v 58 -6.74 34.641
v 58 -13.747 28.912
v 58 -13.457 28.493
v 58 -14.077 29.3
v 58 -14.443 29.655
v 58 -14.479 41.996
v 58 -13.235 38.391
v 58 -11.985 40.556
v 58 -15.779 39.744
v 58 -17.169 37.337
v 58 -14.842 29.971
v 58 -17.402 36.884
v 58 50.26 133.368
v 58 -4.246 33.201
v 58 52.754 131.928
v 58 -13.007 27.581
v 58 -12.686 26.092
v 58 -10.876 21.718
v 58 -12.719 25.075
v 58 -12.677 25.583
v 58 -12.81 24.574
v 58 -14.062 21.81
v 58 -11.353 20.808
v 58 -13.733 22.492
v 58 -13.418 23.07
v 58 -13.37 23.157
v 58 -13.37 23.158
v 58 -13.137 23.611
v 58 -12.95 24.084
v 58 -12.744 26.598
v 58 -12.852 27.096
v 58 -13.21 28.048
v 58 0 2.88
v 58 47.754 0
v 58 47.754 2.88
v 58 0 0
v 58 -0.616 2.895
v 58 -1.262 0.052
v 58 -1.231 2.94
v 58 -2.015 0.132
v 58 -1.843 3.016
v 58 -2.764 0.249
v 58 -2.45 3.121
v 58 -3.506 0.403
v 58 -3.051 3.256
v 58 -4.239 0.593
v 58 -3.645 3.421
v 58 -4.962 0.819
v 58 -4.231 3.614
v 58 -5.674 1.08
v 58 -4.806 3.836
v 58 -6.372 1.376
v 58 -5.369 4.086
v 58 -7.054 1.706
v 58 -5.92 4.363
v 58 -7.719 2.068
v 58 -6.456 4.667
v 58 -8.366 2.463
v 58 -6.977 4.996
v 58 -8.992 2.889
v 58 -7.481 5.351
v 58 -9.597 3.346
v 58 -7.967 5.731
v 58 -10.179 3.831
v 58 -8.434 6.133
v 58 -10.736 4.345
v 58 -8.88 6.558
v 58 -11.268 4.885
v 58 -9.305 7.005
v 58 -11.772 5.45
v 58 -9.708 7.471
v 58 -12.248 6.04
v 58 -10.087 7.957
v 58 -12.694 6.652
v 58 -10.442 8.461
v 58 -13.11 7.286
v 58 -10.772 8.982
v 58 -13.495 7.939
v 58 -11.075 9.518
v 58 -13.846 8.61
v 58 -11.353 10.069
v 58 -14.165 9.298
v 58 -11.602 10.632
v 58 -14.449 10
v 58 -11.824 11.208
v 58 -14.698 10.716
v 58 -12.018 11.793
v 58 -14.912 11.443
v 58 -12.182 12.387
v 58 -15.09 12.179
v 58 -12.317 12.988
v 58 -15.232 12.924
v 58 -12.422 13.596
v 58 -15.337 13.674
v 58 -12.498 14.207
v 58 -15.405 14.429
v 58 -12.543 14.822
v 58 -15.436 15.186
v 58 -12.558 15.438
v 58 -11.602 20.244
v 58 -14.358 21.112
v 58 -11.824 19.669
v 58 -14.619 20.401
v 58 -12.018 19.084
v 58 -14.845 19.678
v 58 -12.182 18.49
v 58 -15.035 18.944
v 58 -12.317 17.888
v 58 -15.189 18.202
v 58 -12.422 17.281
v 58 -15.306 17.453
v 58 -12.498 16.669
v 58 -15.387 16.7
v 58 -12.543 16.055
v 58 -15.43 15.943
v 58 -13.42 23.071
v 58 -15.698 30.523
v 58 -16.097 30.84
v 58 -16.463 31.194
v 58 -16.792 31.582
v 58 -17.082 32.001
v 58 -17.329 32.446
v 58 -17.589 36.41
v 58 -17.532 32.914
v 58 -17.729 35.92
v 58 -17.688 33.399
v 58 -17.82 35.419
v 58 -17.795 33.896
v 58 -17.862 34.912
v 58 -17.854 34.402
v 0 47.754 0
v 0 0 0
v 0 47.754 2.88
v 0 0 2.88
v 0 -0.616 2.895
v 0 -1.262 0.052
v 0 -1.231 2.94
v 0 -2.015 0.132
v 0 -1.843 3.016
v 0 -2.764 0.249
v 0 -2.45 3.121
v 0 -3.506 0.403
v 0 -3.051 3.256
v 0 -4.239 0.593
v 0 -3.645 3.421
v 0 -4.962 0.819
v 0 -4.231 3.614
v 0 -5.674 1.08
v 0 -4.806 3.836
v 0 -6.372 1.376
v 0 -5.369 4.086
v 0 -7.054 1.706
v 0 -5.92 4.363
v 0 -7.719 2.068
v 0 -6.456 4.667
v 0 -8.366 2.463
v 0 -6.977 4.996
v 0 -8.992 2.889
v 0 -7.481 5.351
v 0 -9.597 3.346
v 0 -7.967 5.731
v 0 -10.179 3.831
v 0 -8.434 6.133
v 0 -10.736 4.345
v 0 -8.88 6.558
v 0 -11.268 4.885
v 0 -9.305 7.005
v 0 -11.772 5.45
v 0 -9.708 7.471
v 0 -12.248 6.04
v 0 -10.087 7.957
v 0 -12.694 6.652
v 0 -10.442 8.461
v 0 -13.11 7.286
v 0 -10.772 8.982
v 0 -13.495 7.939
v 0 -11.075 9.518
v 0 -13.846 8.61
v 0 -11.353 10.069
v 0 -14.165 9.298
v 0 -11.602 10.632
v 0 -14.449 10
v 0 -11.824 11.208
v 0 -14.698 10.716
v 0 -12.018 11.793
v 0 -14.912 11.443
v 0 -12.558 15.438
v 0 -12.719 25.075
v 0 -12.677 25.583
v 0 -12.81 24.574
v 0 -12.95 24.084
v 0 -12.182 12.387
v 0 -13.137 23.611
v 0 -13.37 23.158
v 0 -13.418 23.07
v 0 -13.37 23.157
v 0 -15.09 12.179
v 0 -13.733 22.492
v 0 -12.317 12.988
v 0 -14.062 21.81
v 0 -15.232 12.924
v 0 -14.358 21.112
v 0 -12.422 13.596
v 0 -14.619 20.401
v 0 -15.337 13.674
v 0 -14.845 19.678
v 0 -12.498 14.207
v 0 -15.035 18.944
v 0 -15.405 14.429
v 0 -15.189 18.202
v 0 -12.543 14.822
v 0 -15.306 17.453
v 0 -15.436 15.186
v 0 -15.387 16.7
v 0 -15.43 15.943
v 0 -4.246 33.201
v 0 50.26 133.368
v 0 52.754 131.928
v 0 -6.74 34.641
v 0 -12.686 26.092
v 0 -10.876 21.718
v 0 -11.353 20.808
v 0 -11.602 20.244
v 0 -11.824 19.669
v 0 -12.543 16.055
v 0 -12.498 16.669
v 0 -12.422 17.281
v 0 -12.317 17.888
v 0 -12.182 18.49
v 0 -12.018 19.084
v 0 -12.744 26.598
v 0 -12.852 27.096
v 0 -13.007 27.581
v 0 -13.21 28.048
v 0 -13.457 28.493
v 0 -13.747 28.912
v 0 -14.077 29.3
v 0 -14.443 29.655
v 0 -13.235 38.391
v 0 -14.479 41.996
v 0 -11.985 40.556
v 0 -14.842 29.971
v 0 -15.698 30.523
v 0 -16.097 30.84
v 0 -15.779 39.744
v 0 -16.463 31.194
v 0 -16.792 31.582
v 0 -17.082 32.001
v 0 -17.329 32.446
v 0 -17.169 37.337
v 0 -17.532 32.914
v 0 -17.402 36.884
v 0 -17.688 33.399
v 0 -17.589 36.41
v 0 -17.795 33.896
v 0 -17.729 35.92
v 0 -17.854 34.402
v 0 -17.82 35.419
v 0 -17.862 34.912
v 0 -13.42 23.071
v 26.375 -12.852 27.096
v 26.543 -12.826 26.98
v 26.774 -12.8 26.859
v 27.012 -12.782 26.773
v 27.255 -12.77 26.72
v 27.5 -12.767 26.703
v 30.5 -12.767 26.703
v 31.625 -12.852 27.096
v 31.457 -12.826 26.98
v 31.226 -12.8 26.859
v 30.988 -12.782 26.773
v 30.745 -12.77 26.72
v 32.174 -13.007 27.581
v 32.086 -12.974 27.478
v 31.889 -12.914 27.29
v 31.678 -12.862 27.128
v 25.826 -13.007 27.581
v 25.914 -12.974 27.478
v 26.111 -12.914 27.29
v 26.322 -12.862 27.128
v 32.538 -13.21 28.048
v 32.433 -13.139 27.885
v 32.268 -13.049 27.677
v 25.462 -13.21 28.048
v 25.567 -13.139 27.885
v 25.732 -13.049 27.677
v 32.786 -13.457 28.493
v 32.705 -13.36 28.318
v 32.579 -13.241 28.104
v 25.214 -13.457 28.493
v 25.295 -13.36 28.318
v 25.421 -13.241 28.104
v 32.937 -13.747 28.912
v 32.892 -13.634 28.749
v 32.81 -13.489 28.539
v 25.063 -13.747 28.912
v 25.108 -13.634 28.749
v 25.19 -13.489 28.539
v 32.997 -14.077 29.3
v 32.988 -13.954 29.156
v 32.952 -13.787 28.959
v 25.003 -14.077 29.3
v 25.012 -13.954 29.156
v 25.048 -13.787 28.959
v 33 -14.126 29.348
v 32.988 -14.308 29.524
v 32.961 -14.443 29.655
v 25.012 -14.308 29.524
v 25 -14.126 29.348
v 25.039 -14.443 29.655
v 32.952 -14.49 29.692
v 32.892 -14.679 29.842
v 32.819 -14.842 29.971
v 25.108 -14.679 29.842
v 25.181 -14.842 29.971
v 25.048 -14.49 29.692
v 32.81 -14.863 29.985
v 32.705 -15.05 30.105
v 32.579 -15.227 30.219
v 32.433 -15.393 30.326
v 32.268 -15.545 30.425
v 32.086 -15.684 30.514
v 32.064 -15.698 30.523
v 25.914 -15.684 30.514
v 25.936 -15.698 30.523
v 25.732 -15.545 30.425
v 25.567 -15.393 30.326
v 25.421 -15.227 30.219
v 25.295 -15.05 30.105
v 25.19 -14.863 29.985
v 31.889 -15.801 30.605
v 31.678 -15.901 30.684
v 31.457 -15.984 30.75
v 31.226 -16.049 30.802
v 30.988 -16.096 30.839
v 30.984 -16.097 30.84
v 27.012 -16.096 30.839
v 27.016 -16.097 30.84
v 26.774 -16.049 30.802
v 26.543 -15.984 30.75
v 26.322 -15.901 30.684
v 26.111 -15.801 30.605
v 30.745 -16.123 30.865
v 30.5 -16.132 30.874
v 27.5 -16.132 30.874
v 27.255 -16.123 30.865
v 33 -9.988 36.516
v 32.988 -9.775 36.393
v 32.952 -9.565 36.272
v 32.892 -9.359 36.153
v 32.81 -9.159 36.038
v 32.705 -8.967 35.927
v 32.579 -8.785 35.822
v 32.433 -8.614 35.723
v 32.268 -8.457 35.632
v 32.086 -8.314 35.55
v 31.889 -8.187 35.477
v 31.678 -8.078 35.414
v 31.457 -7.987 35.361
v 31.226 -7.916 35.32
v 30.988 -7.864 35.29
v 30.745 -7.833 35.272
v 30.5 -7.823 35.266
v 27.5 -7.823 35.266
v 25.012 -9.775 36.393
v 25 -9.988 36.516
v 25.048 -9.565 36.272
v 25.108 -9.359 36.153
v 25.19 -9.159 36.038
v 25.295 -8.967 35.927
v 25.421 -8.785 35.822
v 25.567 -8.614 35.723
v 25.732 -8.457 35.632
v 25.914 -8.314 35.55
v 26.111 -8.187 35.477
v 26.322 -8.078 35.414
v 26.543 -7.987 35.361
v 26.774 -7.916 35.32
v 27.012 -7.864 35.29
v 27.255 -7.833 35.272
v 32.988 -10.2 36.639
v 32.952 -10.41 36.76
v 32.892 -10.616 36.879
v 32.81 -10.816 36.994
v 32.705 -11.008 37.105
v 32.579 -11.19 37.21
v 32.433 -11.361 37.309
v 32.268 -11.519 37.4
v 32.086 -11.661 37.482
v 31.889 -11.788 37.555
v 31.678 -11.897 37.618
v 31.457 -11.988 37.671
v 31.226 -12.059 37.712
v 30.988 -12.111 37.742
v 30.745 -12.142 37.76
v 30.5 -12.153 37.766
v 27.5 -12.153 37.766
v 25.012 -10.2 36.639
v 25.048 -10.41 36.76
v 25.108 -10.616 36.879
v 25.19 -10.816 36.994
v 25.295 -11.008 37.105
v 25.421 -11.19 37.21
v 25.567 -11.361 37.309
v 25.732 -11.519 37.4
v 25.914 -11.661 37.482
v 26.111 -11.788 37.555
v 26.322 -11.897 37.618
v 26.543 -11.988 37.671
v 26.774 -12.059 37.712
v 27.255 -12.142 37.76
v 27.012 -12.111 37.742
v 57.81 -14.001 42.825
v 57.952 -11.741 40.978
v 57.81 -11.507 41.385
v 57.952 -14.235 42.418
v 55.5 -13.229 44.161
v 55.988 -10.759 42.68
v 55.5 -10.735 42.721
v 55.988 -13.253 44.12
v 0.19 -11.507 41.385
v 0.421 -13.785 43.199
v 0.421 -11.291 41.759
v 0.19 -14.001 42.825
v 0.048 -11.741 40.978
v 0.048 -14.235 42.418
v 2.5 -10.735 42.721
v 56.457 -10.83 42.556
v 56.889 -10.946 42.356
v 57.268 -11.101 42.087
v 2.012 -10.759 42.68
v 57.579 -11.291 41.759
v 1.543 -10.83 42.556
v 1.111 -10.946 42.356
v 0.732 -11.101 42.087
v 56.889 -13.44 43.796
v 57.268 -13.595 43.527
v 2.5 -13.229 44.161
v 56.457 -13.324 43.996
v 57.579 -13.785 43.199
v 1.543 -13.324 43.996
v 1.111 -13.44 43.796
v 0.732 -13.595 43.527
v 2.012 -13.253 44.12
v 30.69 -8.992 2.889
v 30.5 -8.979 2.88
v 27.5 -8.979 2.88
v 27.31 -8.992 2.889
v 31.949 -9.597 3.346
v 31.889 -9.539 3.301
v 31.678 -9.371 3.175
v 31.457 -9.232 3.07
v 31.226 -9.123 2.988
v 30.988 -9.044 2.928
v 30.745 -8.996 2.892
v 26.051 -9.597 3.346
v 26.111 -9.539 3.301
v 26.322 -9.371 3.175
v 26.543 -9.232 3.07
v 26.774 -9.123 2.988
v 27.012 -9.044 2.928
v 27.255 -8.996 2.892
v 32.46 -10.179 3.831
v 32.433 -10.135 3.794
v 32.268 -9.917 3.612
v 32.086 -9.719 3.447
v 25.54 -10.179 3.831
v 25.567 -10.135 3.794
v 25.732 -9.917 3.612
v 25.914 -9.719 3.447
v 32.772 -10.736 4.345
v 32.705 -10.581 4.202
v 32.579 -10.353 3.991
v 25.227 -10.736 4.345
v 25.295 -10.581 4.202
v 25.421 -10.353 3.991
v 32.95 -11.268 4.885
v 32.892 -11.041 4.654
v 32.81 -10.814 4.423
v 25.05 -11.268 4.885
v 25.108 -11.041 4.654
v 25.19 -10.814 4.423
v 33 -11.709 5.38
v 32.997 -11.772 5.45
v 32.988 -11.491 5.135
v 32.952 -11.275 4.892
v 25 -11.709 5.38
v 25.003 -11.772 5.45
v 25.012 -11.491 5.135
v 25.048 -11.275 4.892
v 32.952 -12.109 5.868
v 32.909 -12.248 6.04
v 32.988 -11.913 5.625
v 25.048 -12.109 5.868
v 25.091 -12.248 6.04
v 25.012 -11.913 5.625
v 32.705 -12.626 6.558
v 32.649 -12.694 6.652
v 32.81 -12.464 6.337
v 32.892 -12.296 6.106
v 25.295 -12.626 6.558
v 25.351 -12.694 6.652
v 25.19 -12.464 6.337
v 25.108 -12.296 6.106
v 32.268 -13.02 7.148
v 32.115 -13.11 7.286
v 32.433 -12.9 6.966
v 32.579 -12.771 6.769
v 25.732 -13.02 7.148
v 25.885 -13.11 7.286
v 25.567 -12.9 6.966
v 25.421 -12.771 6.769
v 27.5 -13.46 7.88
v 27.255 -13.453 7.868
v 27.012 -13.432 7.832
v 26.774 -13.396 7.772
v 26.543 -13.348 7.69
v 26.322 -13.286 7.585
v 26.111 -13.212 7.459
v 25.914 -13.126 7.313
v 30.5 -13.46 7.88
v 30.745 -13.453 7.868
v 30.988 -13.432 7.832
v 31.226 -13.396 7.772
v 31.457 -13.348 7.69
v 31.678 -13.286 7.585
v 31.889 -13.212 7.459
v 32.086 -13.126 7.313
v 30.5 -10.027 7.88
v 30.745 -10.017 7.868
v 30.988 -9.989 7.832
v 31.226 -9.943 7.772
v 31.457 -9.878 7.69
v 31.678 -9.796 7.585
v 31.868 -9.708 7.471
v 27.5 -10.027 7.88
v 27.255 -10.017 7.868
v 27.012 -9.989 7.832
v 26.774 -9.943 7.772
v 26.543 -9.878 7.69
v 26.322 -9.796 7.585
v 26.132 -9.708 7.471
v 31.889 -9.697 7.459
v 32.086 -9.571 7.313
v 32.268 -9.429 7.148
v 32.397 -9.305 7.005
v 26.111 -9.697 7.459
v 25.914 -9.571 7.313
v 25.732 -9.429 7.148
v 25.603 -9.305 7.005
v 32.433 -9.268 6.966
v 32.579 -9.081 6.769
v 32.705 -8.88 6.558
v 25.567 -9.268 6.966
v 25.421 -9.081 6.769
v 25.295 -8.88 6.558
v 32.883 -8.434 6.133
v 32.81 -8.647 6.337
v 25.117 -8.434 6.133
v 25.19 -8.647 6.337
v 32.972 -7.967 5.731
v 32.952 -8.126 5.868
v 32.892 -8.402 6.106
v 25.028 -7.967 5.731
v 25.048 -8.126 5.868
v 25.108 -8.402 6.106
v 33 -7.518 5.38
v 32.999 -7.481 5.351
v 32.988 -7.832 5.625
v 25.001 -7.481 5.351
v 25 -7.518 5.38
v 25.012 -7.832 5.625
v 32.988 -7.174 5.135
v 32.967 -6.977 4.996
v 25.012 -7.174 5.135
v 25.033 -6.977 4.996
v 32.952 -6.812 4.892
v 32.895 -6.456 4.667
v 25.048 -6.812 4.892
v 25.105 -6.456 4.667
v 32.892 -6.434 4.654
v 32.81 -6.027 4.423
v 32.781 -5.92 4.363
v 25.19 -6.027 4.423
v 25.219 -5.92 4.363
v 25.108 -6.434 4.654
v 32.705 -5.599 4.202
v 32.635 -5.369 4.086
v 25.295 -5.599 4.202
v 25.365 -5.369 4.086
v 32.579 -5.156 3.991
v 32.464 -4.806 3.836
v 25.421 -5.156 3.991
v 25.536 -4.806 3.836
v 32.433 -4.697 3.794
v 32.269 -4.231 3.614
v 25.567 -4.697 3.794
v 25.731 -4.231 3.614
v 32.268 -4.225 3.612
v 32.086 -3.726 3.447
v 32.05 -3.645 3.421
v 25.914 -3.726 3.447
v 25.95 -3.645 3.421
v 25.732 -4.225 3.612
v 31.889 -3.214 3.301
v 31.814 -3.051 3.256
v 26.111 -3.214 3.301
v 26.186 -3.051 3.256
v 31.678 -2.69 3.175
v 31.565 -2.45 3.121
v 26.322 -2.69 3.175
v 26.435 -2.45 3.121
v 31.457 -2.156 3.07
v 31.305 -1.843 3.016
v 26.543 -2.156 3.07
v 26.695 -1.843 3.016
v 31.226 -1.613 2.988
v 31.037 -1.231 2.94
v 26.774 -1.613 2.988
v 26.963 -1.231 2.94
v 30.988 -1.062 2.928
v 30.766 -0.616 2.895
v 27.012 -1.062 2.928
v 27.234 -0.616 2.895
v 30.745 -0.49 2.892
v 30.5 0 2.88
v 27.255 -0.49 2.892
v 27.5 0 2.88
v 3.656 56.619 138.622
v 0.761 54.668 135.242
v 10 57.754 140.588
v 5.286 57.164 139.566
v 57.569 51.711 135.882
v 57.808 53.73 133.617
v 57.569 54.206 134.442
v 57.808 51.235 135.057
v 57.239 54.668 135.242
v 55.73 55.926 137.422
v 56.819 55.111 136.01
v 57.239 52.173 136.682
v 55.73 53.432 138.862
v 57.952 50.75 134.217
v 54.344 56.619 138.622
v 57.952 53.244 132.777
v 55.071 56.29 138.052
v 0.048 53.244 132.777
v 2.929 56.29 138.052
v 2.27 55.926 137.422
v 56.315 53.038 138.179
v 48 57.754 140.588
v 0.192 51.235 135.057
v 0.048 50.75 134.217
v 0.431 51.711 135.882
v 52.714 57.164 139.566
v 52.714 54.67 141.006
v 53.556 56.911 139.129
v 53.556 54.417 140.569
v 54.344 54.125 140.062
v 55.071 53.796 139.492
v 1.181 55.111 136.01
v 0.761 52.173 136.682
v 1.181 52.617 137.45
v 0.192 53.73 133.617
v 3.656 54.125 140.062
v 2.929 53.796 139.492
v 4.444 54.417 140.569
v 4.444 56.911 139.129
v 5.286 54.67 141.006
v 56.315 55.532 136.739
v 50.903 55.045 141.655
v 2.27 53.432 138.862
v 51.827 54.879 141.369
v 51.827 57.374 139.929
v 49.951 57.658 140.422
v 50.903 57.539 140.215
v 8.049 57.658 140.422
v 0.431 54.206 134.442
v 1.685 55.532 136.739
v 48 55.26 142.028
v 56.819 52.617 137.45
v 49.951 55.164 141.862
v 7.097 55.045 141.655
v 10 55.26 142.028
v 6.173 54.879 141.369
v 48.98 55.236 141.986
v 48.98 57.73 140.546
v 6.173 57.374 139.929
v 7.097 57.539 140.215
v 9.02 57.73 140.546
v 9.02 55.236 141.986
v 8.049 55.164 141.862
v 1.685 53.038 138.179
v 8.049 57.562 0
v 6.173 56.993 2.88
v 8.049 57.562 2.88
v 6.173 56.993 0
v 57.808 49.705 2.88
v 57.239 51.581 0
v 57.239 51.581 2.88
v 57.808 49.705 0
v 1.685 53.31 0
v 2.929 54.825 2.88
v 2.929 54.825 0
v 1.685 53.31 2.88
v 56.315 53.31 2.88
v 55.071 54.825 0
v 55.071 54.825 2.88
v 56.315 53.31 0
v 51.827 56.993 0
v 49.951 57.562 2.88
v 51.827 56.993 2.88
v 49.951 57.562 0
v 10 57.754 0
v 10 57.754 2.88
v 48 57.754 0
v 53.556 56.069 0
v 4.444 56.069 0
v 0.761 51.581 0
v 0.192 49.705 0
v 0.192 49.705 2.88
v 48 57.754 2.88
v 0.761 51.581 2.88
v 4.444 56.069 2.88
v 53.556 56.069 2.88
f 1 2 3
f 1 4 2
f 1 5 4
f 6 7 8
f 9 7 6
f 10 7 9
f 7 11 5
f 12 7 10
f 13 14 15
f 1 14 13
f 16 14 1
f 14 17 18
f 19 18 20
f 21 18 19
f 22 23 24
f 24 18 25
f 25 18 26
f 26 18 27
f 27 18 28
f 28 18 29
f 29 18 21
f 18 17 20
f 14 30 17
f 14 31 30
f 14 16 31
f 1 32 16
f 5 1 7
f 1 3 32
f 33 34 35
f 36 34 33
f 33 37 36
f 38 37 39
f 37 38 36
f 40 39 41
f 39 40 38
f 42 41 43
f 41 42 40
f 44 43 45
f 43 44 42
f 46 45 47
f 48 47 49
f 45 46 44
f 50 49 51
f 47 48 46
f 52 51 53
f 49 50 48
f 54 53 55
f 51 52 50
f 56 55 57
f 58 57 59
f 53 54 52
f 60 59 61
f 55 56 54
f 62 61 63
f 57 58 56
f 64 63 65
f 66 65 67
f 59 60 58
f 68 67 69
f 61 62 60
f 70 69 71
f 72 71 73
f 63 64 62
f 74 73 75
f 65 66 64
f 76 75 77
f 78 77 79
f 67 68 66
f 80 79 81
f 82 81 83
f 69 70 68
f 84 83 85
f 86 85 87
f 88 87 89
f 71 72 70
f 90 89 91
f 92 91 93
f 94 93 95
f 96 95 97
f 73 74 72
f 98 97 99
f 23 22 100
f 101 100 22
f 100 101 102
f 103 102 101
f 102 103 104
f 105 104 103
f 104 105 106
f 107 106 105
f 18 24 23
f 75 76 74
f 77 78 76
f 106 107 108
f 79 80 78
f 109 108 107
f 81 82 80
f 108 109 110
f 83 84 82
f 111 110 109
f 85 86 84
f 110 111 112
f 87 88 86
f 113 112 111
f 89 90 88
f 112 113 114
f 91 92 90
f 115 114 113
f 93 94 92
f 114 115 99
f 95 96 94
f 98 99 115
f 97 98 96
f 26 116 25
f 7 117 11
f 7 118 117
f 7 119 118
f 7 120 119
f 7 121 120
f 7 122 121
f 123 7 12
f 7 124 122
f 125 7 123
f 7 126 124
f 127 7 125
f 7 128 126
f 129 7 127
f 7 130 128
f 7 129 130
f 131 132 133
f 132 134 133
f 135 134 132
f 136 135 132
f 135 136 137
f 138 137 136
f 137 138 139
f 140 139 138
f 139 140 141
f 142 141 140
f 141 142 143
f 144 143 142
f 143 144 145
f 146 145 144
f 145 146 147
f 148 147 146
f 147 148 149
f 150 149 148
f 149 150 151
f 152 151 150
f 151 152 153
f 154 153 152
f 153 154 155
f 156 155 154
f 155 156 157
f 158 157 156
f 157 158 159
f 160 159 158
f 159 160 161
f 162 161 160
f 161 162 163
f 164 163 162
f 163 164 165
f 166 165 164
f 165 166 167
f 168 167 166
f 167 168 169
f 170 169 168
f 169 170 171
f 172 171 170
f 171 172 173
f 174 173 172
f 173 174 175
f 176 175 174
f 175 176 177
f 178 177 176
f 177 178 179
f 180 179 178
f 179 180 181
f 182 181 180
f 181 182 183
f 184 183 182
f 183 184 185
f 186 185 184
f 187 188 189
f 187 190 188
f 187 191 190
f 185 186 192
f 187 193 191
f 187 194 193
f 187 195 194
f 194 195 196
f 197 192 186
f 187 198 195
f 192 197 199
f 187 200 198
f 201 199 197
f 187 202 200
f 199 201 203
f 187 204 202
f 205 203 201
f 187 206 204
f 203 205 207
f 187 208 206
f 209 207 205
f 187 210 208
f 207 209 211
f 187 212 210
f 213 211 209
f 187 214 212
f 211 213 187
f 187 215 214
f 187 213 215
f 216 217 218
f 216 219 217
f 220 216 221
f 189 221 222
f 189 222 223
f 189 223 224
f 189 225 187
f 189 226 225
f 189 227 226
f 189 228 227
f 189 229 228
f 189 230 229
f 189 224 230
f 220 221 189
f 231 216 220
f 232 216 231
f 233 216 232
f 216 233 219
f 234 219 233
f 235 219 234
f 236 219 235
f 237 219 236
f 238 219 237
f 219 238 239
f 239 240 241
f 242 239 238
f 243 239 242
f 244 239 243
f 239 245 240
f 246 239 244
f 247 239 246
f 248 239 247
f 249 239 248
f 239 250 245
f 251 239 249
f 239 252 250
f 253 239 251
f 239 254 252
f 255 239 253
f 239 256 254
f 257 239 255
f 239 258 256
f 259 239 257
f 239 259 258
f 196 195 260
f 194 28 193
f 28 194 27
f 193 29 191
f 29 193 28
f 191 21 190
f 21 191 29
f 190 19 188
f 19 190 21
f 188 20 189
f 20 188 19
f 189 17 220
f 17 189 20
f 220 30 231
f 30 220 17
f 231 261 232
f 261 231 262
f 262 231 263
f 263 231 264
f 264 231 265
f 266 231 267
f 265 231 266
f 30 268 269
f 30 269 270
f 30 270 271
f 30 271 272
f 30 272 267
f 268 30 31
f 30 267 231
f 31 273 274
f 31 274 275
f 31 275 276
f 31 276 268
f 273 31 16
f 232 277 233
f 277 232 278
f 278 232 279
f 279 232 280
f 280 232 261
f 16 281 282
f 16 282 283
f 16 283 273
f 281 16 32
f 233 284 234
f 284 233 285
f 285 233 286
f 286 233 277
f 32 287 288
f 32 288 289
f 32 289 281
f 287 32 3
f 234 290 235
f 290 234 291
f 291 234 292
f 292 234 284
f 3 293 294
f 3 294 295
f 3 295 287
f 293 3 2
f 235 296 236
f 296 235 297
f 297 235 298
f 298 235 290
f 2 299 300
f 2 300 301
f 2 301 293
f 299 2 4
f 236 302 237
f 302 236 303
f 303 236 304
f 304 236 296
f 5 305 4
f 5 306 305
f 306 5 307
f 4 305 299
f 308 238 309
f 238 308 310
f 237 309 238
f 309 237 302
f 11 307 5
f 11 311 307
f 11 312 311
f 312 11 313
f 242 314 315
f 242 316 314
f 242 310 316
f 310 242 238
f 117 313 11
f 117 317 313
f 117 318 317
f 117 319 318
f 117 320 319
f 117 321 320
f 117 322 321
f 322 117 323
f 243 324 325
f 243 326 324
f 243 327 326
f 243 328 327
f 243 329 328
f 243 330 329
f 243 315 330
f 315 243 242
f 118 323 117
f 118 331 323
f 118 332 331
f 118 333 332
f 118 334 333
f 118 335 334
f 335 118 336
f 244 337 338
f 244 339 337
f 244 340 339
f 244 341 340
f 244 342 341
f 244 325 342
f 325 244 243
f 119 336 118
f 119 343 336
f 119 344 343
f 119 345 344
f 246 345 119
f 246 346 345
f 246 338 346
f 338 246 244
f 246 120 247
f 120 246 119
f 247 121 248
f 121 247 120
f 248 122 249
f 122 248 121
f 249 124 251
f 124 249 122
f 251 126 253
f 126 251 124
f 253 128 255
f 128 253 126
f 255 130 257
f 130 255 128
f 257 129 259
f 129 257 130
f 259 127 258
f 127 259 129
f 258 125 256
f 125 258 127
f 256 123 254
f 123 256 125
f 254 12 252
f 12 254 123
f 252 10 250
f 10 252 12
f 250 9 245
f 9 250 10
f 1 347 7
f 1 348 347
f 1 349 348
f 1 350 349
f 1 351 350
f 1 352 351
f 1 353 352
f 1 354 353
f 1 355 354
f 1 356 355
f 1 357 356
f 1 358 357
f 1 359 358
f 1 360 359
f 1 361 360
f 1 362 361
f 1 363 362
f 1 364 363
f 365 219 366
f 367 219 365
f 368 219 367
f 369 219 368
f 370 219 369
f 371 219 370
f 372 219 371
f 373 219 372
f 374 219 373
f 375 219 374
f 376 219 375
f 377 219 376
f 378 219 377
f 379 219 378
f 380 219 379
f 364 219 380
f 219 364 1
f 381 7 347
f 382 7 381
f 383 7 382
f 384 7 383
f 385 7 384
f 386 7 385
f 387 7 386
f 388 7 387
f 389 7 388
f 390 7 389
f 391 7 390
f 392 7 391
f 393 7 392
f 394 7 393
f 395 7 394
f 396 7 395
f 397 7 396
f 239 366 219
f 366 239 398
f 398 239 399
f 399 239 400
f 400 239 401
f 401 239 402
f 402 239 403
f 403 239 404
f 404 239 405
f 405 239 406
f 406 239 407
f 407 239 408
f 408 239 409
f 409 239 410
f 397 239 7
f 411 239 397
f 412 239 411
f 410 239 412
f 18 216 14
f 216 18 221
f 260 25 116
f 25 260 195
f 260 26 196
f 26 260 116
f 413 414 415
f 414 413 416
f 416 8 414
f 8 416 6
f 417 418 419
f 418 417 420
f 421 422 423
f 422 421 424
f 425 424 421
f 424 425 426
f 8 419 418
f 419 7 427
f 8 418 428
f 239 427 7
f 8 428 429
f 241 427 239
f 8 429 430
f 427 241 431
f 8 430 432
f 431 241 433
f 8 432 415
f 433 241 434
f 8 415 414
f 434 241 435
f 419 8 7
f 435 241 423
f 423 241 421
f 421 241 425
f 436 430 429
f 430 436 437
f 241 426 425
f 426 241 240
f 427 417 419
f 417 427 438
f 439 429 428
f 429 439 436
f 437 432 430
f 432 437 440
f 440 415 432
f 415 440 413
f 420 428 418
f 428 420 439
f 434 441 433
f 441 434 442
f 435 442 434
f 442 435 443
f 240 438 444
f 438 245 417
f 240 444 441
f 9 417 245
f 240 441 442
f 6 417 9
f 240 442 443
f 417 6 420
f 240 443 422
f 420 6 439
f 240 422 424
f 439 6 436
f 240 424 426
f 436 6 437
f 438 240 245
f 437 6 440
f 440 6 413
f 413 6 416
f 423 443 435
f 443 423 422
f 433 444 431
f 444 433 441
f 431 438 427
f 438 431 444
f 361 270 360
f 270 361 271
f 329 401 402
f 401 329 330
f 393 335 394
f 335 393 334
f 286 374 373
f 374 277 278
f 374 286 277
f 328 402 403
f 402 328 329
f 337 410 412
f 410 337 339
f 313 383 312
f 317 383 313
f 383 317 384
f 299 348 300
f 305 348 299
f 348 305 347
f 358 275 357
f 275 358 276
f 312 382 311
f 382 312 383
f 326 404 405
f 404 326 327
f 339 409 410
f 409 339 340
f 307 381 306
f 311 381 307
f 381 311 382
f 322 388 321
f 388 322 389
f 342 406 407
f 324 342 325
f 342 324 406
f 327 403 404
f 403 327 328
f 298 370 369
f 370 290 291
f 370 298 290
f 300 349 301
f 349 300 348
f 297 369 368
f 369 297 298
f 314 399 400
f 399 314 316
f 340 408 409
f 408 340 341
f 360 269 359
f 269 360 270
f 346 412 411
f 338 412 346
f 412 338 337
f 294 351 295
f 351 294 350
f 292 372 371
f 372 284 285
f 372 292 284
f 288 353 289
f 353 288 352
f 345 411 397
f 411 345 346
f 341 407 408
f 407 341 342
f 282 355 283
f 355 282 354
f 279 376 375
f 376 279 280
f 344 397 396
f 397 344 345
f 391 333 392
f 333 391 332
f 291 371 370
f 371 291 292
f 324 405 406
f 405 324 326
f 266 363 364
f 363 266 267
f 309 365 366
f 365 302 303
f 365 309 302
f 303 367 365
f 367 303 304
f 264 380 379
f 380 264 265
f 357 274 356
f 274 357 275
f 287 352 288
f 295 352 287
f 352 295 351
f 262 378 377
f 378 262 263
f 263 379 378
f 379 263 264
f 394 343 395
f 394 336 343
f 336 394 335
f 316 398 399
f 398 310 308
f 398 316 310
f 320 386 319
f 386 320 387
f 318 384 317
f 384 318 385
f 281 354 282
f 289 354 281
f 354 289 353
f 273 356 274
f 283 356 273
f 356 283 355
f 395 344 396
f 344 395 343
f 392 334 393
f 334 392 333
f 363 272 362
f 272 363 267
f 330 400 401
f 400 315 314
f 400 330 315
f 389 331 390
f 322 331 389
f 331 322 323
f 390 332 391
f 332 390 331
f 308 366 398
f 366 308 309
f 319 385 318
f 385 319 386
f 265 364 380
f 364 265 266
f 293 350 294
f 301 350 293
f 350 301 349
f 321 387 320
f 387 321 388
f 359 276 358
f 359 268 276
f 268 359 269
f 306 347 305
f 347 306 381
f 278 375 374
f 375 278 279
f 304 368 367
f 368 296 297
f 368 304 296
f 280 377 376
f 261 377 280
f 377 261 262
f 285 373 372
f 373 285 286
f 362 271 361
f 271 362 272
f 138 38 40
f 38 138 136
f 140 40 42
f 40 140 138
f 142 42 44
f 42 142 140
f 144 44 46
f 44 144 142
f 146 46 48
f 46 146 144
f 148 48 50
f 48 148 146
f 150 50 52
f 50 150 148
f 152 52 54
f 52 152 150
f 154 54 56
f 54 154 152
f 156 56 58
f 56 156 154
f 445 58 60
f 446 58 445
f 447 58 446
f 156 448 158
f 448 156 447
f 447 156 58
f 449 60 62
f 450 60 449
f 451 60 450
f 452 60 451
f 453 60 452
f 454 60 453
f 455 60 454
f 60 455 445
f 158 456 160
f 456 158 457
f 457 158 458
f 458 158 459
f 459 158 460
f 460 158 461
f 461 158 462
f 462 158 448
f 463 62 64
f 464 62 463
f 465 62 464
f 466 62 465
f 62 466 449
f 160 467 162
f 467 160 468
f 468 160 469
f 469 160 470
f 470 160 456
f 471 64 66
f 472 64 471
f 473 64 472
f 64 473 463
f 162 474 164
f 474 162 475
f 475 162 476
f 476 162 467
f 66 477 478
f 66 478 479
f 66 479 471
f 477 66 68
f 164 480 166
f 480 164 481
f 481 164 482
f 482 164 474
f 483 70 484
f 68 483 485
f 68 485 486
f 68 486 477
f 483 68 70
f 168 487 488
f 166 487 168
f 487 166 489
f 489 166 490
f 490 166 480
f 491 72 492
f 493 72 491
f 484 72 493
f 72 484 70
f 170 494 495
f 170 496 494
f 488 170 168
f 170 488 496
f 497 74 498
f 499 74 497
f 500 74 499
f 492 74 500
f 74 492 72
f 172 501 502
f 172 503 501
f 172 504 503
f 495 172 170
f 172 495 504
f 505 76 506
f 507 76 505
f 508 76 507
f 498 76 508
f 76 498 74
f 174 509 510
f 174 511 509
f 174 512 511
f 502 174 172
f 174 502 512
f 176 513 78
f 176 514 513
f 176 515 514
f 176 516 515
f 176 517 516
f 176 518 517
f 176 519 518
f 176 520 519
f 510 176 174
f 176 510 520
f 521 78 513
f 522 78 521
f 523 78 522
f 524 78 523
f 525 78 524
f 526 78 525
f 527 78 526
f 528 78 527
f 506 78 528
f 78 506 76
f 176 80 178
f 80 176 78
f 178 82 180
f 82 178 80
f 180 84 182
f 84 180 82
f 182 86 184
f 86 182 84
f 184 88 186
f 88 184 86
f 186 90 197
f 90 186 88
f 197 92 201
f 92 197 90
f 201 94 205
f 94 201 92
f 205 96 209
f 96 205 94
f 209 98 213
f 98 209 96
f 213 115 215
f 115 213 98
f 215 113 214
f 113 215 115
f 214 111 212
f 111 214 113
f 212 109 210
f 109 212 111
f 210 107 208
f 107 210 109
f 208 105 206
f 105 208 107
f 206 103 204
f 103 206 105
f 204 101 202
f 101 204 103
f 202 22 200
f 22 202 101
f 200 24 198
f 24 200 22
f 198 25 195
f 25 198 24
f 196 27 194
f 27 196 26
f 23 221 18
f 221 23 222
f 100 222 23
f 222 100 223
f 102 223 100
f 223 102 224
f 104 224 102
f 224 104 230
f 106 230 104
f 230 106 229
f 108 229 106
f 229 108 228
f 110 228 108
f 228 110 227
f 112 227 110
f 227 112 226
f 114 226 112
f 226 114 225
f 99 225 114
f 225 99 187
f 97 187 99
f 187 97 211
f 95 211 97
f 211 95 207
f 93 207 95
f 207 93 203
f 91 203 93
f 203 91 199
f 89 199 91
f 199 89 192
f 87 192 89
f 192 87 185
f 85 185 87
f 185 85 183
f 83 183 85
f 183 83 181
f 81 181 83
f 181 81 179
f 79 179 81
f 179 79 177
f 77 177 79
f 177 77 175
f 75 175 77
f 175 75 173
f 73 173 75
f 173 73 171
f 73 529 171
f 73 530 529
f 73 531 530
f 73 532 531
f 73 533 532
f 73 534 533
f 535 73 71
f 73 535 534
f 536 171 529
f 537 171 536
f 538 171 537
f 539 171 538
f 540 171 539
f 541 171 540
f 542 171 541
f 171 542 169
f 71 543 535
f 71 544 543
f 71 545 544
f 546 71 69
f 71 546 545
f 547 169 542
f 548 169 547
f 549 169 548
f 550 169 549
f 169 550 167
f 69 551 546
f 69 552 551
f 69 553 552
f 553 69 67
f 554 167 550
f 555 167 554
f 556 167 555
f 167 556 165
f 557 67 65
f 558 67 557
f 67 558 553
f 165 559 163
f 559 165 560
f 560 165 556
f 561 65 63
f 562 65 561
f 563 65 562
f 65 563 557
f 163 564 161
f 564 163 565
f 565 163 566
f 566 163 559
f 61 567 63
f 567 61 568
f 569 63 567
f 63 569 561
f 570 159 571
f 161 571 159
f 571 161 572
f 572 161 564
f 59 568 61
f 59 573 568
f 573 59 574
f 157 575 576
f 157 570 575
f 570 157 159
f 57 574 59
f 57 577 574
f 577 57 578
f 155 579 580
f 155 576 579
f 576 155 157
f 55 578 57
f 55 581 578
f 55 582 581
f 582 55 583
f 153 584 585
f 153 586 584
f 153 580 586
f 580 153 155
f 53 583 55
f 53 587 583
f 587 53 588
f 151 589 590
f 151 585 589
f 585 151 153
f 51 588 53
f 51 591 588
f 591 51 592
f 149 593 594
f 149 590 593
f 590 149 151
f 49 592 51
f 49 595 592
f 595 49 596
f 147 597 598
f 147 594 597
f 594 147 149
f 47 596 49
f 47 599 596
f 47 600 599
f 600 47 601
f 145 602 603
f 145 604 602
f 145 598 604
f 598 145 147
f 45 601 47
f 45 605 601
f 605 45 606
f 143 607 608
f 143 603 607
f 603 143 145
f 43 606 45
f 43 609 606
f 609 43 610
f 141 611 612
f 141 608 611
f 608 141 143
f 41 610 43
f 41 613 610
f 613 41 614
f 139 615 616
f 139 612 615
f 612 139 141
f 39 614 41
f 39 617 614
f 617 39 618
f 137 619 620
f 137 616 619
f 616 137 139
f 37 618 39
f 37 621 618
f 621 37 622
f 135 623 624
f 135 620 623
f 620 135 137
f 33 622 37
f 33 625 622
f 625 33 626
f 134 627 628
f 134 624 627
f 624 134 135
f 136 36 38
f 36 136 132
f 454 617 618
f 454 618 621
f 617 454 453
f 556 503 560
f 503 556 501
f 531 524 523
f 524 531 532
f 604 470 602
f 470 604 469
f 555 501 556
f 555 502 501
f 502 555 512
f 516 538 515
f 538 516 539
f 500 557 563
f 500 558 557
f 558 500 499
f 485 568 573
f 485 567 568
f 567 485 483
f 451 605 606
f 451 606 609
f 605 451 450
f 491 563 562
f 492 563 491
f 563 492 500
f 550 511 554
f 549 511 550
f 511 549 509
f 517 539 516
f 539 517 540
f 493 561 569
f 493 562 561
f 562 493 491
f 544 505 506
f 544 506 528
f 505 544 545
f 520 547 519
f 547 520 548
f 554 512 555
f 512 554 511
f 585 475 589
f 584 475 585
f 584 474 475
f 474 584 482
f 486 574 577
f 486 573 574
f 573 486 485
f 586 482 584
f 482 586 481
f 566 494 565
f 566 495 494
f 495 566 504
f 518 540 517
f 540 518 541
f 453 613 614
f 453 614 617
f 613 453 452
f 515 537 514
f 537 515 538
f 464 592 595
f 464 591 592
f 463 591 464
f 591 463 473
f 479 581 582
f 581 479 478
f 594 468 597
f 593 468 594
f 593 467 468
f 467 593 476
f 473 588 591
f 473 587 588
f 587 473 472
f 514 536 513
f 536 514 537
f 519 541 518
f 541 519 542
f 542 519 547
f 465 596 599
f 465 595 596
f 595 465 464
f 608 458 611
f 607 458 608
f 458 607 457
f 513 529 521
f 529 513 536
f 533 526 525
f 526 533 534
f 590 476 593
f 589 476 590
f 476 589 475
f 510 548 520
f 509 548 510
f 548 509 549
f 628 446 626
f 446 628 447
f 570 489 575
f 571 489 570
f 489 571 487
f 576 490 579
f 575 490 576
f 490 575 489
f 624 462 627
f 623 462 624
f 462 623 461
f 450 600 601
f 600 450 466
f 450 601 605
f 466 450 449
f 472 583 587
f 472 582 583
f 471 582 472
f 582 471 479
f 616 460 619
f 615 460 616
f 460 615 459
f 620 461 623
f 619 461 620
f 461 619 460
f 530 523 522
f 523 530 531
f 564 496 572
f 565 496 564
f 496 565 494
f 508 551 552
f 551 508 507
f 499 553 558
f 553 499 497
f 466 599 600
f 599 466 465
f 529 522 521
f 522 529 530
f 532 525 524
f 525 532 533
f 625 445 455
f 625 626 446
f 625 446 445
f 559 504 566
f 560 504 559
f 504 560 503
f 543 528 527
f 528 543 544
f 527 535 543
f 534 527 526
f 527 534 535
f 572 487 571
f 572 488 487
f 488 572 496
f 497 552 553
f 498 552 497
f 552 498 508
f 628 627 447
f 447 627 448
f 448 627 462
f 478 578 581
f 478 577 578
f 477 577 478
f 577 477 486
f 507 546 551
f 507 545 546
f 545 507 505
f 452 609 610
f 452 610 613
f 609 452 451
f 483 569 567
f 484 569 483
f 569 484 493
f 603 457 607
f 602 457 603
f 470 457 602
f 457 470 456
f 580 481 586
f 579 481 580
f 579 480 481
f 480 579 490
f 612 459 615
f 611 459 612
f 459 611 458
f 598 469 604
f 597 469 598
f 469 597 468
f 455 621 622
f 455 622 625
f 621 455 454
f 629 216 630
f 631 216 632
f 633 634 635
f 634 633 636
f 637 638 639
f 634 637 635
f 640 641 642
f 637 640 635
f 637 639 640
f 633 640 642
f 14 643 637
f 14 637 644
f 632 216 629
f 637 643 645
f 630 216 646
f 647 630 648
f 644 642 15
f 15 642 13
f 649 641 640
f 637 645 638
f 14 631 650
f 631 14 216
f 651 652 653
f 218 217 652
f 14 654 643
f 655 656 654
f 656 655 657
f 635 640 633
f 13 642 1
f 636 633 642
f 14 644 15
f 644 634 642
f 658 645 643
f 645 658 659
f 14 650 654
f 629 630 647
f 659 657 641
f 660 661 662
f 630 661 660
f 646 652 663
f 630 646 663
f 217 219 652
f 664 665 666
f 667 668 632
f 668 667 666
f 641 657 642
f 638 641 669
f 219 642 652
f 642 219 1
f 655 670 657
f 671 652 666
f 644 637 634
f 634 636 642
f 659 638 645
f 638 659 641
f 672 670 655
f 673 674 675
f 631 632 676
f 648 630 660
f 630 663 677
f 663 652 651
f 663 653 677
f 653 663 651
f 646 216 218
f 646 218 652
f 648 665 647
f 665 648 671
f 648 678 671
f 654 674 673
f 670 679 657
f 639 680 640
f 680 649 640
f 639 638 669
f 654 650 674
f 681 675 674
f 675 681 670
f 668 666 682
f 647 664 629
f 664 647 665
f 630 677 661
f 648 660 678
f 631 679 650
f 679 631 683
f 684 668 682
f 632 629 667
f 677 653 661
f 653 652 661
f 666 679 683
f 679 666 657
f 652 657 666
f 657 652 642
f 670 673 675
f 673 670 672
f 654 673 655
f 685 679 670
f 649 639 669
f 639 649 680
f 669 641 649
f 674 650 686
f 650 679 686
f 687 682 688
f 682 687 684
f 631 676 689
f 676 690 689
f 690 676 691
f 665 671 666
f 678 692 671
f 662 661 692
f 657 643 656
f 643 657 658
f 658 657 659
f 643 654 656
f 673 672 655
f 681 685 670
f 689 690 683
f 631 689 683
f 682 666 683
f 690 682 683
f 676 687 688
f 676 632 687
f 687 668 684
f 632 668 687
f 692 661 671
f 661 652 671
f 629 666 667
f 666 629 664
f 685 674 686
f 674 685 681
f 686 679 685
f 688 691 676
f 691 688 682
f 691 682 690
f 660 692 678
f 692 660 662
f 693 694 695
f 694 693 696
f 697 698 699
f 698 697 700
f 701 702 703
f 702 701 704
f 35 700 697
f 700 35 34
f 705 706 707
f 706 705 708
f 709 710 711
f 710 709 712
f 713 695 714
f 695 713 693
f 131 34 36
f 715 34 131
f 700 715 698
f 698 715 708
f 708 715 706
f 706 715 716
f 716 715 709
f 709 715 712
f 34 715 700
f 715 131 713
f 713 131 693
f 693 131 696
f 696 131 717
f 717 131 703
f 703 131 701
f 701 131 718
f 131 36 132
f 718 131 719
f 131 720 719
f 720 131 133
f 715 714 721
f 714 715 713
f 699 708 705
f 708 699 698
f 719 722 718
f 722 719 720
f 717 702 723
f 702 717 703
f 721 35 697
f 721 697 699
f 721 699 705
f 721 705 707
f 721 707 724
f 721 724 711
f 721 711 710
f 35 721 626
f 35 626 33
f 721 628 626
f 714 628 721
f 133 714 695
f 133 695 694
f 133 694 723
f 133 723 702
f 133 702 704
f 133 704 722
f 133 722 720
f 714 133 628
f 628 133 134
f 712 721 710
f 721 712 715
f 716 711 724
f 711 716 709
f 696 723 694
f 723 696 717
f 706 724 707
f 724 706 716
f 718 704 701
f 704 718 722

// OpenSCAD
/* [Device] */

// Device width
device_width = 58;

// Device height
device_height = 124;

// Device thickess
device_thickness = 7.5;

/* [Charger] */

// Make charger holes or not
charger_holes = "yes"; // [yes,no]

// Charger plug width
charger_width = 8;

// Charger plug height + wire length 
charger_height = 40;

// Charger thickness
charger_thickness = 5;

// Charger position X factor
charger_position_factor_x = 0.5; // [0:0.01:1]

// Charger position Y factor
charger_position_factor_y = 0.5; // [0:0.01:1]

/* [Misc] */

// Thickness of holder
holder_thickness = 2.88;

// Fillet radius for base and foot parts
holder_fillet = 10;

// Holder angle
holder_angle = 30; // [0:0.5:80]

// Factor to cut the base
holder_cut_factor = 0; // [0:0.01:1]

// Arc radius
arc_radius = "default";

// Foot length
foot_length = "default";

/* [Shelf] */

// Shape of shelf 
shelf_shape = "darc"; // [darc,arc,tri]

// Additional shelf height
shelf_additional_height = "default";

// Height of front support (set to zero if you dont want front support)
front_support_height = 5;

// Front support fillet radius
front_support_fillet = "default";

/* [Patterns] */

// Outline for base part
base_pattern_outline = "default";

// Outline for foot part
foot_pattern_outline = "default";

// Base part pattern preset
base_pattern_preset = 0; // [0:1:33]

// Foot part pattern preset
foot_pattern_preset = 0; // [0:1:33]


module holder() {

    charger_position_factors = [charger_position_factor_x, charger_position_factor_y];
    device_dimensions = [device_width,device_height,device_thickness];
    charger_dimensions = [charger_width, charger_height, charger_thickness]; // include wire bending in height

    // Additional height for shelf (if you want flat shelf - set it to 0)
    front_support_fillet_val = front_support_fillet != "default" ? front_support_fillet : front_support_height / 2;
    shelf_additional_height_val = shelf_additional_height != "default" ? shelf_additional_height : device_dimensions[2] + holder_thickness;
    arc_radius_val = arc_radius != "default" ? arc_radius : (charger_dimensions[1] - (holder_thickness + shelf_additional_height_val)) * sin(45 - holder_angle / 2) / sin(45 + holder_angle / 2);
    foot_length_val = foot_length != "default" ? foot_length : (device_dimensions[1] + (holder_thickness + shelf_additional_height_val) - arc_radius_val * sin(90 - holder_angle) / sin(holder_angle)) * cos(90 - holder_angle) + holder_thickness * cos(holder_angle);

    // outline for pattern
    pattern_outlines = [
        base_pattern_outline != "default" ? base_pattern_outline : holder_thickness, 
        foot_pattern_outline != "default" ? foot_pattern_outline : holder_thickness
        ];
    pattern_presets = [base_pattern_preset, foot_pattern_preset];

    module concentric_pattern(d, t) {
        center = [d[0]/2, d[1]/2];
        translate(center, $fa=2, $fs=0.1) {
            for (i = [t:t * 2:max(d[0],d[1])]) {
                difference() {
                    circle(i + t);
                    circle(i);
                }
            }
        }
    }


    module place_grid(d, grid, offsets=true, hex=false) {
        off = offsets ? grid : [d[0] / grid[0], d[1] / grid[1]];
        cnt = [ceil(d[0]/off[0]) + 2, ceil(d[1]/off[1]) + (hex ? 3 : 2)];
        start = [d[0] / 2 - cnt[0]*off[0] / 2, d[1] / 2 - cnt[1]*off[1] / 2];
        for (xi = [0:cnt[0]-1], yi = [0:cnt[1]-1]) {
            translate([xi * off[0] + start[0] + off[0] / 2, yi * off[1] + start[1] + off[1] / 2 - (xi % 2 != 0 && hex ? off[1]/2 : 0)])
                children(); 
        }
    }

    module place_circular(d, r, min_angle) {
        
        c = [d[0]/2,d[1]/2];
        cnt = max(d[0],d[1])/r;
        
        for (ri = [0:cnt-1]) {
            if (ri == 0) {
                
                translate(c) 
                    children();
                
            } else {
                
                rf = ri * r;
                steps = arc_step_count(rf, 360);
                step = 360/steps;
                
                for (a = [0:steps-1])
                    translate([cos(a * step) * rf + c[0], sin(a * step) * rf + c[1]])
                        children();
            }
        }
    }

    module profile(thickness) {
        difference() {
            offset(delta = thickness)
                children();
            children();
        }
    }


    pattern_preset_modes = [
        "n", 
        // ngons + cirle (offset y)    
        "d", "d", "d", "d", "d", "d", "d", "d",
        // ngons + circle (no y offset)
        "d", "d", "d", "d", "d", "d", "d", "d",

        // ngons + cirle (offset y)    
        "i", "i", "i", "i", "i", "i", "i", "i", 
        // ngons + circle (no y offset)
        "i", "i", "i", "i", "i", "i", "i", "i", 
        // concentric
        "i"
    ];
    pattern_preset_thickness = [
        0,
        0,0,0,0,0,0,0,0,
        0,0,0,0,0,0,0,0,
        0,0,0,0,0,0,0,0,
        0,0,0,0,0,0,0,0,
        0.4
    ];

    // i - intersection, d - difference
    pattern_modes = [pattern_preset_modes[pattern_presets[0]], pattern_preset_modes[pattern_presets[1]]]; 

    // useful for text
    pattern_thickness = [pattern_preset_thickness[pattern_presets[0]], pattern_preset_thickness[pattern_presets[1]]];

    module pattern(part, dim) {   
        preset = pattern_presets[part];
        if (preset >= 1 && preset <= 16) {
            
            n = (preset - 1) % 8 + 3;
            r = 5;
                   
            place_grid(dim, [r * 2 + (preset >= 8 ? holder_thickness / 2 : 0), r * 2 + holder_thickness / 2], hex = preset < 8)
                if (n == 9) 
                    rotate(45)
                        ngon(4, r);
                else if (n == 10)
                    circle(r);
                else
                    ngon(n, r);
                
        } else if (preset >= 17 && preset <= 32) {
            
            n = (preset - 17) % 8 + 3;
            r = 12;
            
            place_grid(dim, [r + holder_thickness, r], hex = preset < 8)
                profile(2) {
                    if (n == 9) 
                        rotate(45)
                            ngon(4, r);
                    else if (n == 10)
                        circle(r);
                    else
                        ngon(n, r);
                }
                
        } else if (preset == 33) {
            concentric_pattern(dim, 0.8);
        }
    }

    function radius_x(r) = r[0] == undef ? r : r[0];
    function radius_y(r) = r[1] == undef ? r : r[1];
    function ellipse_perimeter(r) = let(rx = radius_x(r), ry = radius_y(r)) 2 * PI * ((rx == ry) ? rx : sqrt((rx*rx + ry*ry) / 2));
    function arc_step_count(r, a) = $fn > 0 ? a / 360 * $fn : ceil(max(min(a / $fa, ellipse_perimeter(r) / $fs), 5));
    function arc_step(s, e, c) = (e - s) / c;
    function arc_pt(r, a, p) = [cos(a) * radius_x(r) + p[0], sin(a) * radius_y(r) + p[1]];
    function arc_loop_no_close(r, s, e, p, c) = [ for(i = [0 : c-1]) arc_pt(r, s + i * arc_step(s, e, c), p) ];
    function arc_loop(r, s, e, p, c, close = true) = close 
        ? concat(arc_loop_no_close(r,s,e,p,c), [arc_pt(r, e, p)])
        : arc_loop_no_close(r,s,e,p,c);
    function arc(r, s, e, p = [0,0], close = true) = arc_loop(r, s, e, p, arc_step_count(r, abs(e - s)), close);

    function ngon_poly(n, r, p = [0, 0]) = arc_loop_no_close(r, 0, 360, p, n);
    module ngon(n, r) 
        polygon(ngon_poly(n, r));

    module arc_shape(r, s, e, thickness) {
        inner = arc(r - thickness, s, e);
        outer = arc(r, e, s);
        polygon(concat(inner, outer));
    }

    mount_plate_dim = [device_dimensions[0], device_dimensions[1] * (1 - holder_cut_factor), holder_thickness];
    shelf_dim = [device_dimensions[2] + holder_thickness * 2, holder_thickness + shelf_additional_height_val];

    // tolerance to join parts
    union_tolerance = 0.1;

    module square_top_fillet(d, r = 0) {
        if (r == 0) {
            square([d[0], d[1]]);
        } else {
            polygon(concat([[0,0],[d[0],0]],
                arc(r, 0, 90, [d[0] - r, d[1] - r], true),
                arc(r, 90, 180, [r, d[1] - r], true)
            ));
        }
    }

    module charger(height) {
        if (charger_holes == "yes") {
        
            translate([charger_position_factors[0] * device_dimensions[0] + charger_dimensions[2] / 2 - charger_dimensions[0] / 2, 0, holder_thickness + charger_dimensions[2] / 2])
            rotate([-90,0,0])
            hull($fn=64) {
                cylinder(d = charger_dimensions[2], h = height);
                translate([charger_dimensions[0] - charger_dimensions[2], 0, 0]) cylinder(d = charger_dimensions[2], h = height);
            }
            
        }
    }

    module pattern_mode(mode) {
        if (mode == "i") {
            intersection() {
                children(0);
                children(1);
            }
        } else if (mode == "d") {
            difference() {
                children(0);
                children(1);
            }
        } else {
            children();
        }
    }

    module pattern_filled(part, dim, off=[0,0]) {
        linear_extrude(holder_thickness) {
            difference() {
                children();
                offset(-pattern_outlines[part])
                    children();
            }
            translate([pattern_outlines[part] + off[0], pattern_outlines[part] + off[1]]) 
                pattern_mode(pattern_modes[part]) {
                    translate([-pattern_outlines[part] - off[0], -pattern_outlines[part] - off[1]])
                        children();
                    pattern(part, [dim[0] - pattern_outlines[part] * 2, dim[1] - pattern_outlines[part] * 2]);
                }
        }
        
        pt = pattern_thickness[part];
        if (pt > 0) {
            linear_extrude(holder_thickness - pt)
                children();
        }
    }

    module holder_base() {
        pattern_filled(0, [mount_plate_dim[0], mount_plate_dim[1]], [0,shelf_dim[1]])
            translate([0, shelf_dim[1]])
                square_top_fillet(mount_plate_dim, holder_fillet, $fn = 64);        
    }

    module holder_shelf() {
        difference() {
            union() {
                translate([mount_plate_dim[0],0])
                rotate([0,-90,0])
                linear_extrude(mount_plate_dim[0], $fn = 64)
                    polygon(concat(
                        [
                            [0,0], 
                            [0,-union_tolerance],
                            [holder_thickness,-union_tolerance]
                        ],
                        shelf_additional_height_val == 0 || (shelf_shape != "arc" && shelf_shape != "darc") ?
                            [[holder_thickness,0], [shelf_dim[0], shelf_additional_height_val]] :
                        shelf_shape == "arc" ?
                            arc([shelf_dim[0] - holder_thickness, shelf_additional_height_val], 180, 90, [shelf_dim[0], 0]) :
                            concat(
                                arc([(shelf_dim[0] - holder_thickness) / 2, shelf_additional_height_val / 2], 180, 90, [(shelf_dim[0] + holder_thickness) / 2, 0], false),
                                arc([(shelf_dim[0] - holder_thickness) / 2, shelf_additional_height_val / 2], -90, 0, [(shelf_dim[0] + holder_thickness) / 2, shelf_additional_height_val], true)
                            ),
                        [
                            [shelf_dim[0], shelf_dim[1]], 
                            [holder_thickness, shelf_dim[1]], 
                            [holder_thickness, shelf_dim[1] + union_tolerance], 
                            [0, shelf_dim[1] + union_tolerance]
                        ]
                    ));
                    
                if (front_support_height > 0) {
                    translate([0, shelf_dim[1] - union_tolerance, device_dimensions[2] + holder_thickness])
                    linear_extrude(holder_thickness)
                        square_top_fillet([device_dimensions[0], front_support_height + union_tolerance], front_support_fillet_val);
                }
            }
            
            translate([0, 0, charger_position_factors[1] * (device_dimensions[2] - charger_dimensions[2])])
            charger(shelf_dim[1] + front_support_height + 1);
        }
    }

    module holder_foot() {
        dimensions = [mount_plate_dim[0], foot_length_val];
        pattern_filled(1, dimensions) 
            square_top_fillet(dimensions, holder_fillet);
    }
        
    module holder_arc() {
        translate([mount_plate_dim[0], 0, arc_radius_val])
            rotate([90,0,0])
                rotate([0, -90, 0])
                    linear_extrude(mount_plate_dim[0], $fn = 128)
                        arc_shape(arc_radius_val, -90, holder_angle, holder_thickness);
    }

    union() { 

        translate([0,0,arc_radius_val])
        rotate([90 - holder_angle, 0, 0])
        translate([0,0,arc_radius_val - holder_thickness])    
        holder_base();
        
        render()
        difference() {
            
            union() {
                translate([0,0,arc_radius_val])
                rotate([90 - holder_angle, 0, 0])
                translate([0,0,arc_radius_val - holder_thickness])    
                holder_shelf();
                holder_arc();
            }
            
            translate([0, -arc_radius_val - 1, 0])
                charger(arc_radius_val + holder_thickness + 1);
        }
        
        holder_foot();
    }

}

holder();
